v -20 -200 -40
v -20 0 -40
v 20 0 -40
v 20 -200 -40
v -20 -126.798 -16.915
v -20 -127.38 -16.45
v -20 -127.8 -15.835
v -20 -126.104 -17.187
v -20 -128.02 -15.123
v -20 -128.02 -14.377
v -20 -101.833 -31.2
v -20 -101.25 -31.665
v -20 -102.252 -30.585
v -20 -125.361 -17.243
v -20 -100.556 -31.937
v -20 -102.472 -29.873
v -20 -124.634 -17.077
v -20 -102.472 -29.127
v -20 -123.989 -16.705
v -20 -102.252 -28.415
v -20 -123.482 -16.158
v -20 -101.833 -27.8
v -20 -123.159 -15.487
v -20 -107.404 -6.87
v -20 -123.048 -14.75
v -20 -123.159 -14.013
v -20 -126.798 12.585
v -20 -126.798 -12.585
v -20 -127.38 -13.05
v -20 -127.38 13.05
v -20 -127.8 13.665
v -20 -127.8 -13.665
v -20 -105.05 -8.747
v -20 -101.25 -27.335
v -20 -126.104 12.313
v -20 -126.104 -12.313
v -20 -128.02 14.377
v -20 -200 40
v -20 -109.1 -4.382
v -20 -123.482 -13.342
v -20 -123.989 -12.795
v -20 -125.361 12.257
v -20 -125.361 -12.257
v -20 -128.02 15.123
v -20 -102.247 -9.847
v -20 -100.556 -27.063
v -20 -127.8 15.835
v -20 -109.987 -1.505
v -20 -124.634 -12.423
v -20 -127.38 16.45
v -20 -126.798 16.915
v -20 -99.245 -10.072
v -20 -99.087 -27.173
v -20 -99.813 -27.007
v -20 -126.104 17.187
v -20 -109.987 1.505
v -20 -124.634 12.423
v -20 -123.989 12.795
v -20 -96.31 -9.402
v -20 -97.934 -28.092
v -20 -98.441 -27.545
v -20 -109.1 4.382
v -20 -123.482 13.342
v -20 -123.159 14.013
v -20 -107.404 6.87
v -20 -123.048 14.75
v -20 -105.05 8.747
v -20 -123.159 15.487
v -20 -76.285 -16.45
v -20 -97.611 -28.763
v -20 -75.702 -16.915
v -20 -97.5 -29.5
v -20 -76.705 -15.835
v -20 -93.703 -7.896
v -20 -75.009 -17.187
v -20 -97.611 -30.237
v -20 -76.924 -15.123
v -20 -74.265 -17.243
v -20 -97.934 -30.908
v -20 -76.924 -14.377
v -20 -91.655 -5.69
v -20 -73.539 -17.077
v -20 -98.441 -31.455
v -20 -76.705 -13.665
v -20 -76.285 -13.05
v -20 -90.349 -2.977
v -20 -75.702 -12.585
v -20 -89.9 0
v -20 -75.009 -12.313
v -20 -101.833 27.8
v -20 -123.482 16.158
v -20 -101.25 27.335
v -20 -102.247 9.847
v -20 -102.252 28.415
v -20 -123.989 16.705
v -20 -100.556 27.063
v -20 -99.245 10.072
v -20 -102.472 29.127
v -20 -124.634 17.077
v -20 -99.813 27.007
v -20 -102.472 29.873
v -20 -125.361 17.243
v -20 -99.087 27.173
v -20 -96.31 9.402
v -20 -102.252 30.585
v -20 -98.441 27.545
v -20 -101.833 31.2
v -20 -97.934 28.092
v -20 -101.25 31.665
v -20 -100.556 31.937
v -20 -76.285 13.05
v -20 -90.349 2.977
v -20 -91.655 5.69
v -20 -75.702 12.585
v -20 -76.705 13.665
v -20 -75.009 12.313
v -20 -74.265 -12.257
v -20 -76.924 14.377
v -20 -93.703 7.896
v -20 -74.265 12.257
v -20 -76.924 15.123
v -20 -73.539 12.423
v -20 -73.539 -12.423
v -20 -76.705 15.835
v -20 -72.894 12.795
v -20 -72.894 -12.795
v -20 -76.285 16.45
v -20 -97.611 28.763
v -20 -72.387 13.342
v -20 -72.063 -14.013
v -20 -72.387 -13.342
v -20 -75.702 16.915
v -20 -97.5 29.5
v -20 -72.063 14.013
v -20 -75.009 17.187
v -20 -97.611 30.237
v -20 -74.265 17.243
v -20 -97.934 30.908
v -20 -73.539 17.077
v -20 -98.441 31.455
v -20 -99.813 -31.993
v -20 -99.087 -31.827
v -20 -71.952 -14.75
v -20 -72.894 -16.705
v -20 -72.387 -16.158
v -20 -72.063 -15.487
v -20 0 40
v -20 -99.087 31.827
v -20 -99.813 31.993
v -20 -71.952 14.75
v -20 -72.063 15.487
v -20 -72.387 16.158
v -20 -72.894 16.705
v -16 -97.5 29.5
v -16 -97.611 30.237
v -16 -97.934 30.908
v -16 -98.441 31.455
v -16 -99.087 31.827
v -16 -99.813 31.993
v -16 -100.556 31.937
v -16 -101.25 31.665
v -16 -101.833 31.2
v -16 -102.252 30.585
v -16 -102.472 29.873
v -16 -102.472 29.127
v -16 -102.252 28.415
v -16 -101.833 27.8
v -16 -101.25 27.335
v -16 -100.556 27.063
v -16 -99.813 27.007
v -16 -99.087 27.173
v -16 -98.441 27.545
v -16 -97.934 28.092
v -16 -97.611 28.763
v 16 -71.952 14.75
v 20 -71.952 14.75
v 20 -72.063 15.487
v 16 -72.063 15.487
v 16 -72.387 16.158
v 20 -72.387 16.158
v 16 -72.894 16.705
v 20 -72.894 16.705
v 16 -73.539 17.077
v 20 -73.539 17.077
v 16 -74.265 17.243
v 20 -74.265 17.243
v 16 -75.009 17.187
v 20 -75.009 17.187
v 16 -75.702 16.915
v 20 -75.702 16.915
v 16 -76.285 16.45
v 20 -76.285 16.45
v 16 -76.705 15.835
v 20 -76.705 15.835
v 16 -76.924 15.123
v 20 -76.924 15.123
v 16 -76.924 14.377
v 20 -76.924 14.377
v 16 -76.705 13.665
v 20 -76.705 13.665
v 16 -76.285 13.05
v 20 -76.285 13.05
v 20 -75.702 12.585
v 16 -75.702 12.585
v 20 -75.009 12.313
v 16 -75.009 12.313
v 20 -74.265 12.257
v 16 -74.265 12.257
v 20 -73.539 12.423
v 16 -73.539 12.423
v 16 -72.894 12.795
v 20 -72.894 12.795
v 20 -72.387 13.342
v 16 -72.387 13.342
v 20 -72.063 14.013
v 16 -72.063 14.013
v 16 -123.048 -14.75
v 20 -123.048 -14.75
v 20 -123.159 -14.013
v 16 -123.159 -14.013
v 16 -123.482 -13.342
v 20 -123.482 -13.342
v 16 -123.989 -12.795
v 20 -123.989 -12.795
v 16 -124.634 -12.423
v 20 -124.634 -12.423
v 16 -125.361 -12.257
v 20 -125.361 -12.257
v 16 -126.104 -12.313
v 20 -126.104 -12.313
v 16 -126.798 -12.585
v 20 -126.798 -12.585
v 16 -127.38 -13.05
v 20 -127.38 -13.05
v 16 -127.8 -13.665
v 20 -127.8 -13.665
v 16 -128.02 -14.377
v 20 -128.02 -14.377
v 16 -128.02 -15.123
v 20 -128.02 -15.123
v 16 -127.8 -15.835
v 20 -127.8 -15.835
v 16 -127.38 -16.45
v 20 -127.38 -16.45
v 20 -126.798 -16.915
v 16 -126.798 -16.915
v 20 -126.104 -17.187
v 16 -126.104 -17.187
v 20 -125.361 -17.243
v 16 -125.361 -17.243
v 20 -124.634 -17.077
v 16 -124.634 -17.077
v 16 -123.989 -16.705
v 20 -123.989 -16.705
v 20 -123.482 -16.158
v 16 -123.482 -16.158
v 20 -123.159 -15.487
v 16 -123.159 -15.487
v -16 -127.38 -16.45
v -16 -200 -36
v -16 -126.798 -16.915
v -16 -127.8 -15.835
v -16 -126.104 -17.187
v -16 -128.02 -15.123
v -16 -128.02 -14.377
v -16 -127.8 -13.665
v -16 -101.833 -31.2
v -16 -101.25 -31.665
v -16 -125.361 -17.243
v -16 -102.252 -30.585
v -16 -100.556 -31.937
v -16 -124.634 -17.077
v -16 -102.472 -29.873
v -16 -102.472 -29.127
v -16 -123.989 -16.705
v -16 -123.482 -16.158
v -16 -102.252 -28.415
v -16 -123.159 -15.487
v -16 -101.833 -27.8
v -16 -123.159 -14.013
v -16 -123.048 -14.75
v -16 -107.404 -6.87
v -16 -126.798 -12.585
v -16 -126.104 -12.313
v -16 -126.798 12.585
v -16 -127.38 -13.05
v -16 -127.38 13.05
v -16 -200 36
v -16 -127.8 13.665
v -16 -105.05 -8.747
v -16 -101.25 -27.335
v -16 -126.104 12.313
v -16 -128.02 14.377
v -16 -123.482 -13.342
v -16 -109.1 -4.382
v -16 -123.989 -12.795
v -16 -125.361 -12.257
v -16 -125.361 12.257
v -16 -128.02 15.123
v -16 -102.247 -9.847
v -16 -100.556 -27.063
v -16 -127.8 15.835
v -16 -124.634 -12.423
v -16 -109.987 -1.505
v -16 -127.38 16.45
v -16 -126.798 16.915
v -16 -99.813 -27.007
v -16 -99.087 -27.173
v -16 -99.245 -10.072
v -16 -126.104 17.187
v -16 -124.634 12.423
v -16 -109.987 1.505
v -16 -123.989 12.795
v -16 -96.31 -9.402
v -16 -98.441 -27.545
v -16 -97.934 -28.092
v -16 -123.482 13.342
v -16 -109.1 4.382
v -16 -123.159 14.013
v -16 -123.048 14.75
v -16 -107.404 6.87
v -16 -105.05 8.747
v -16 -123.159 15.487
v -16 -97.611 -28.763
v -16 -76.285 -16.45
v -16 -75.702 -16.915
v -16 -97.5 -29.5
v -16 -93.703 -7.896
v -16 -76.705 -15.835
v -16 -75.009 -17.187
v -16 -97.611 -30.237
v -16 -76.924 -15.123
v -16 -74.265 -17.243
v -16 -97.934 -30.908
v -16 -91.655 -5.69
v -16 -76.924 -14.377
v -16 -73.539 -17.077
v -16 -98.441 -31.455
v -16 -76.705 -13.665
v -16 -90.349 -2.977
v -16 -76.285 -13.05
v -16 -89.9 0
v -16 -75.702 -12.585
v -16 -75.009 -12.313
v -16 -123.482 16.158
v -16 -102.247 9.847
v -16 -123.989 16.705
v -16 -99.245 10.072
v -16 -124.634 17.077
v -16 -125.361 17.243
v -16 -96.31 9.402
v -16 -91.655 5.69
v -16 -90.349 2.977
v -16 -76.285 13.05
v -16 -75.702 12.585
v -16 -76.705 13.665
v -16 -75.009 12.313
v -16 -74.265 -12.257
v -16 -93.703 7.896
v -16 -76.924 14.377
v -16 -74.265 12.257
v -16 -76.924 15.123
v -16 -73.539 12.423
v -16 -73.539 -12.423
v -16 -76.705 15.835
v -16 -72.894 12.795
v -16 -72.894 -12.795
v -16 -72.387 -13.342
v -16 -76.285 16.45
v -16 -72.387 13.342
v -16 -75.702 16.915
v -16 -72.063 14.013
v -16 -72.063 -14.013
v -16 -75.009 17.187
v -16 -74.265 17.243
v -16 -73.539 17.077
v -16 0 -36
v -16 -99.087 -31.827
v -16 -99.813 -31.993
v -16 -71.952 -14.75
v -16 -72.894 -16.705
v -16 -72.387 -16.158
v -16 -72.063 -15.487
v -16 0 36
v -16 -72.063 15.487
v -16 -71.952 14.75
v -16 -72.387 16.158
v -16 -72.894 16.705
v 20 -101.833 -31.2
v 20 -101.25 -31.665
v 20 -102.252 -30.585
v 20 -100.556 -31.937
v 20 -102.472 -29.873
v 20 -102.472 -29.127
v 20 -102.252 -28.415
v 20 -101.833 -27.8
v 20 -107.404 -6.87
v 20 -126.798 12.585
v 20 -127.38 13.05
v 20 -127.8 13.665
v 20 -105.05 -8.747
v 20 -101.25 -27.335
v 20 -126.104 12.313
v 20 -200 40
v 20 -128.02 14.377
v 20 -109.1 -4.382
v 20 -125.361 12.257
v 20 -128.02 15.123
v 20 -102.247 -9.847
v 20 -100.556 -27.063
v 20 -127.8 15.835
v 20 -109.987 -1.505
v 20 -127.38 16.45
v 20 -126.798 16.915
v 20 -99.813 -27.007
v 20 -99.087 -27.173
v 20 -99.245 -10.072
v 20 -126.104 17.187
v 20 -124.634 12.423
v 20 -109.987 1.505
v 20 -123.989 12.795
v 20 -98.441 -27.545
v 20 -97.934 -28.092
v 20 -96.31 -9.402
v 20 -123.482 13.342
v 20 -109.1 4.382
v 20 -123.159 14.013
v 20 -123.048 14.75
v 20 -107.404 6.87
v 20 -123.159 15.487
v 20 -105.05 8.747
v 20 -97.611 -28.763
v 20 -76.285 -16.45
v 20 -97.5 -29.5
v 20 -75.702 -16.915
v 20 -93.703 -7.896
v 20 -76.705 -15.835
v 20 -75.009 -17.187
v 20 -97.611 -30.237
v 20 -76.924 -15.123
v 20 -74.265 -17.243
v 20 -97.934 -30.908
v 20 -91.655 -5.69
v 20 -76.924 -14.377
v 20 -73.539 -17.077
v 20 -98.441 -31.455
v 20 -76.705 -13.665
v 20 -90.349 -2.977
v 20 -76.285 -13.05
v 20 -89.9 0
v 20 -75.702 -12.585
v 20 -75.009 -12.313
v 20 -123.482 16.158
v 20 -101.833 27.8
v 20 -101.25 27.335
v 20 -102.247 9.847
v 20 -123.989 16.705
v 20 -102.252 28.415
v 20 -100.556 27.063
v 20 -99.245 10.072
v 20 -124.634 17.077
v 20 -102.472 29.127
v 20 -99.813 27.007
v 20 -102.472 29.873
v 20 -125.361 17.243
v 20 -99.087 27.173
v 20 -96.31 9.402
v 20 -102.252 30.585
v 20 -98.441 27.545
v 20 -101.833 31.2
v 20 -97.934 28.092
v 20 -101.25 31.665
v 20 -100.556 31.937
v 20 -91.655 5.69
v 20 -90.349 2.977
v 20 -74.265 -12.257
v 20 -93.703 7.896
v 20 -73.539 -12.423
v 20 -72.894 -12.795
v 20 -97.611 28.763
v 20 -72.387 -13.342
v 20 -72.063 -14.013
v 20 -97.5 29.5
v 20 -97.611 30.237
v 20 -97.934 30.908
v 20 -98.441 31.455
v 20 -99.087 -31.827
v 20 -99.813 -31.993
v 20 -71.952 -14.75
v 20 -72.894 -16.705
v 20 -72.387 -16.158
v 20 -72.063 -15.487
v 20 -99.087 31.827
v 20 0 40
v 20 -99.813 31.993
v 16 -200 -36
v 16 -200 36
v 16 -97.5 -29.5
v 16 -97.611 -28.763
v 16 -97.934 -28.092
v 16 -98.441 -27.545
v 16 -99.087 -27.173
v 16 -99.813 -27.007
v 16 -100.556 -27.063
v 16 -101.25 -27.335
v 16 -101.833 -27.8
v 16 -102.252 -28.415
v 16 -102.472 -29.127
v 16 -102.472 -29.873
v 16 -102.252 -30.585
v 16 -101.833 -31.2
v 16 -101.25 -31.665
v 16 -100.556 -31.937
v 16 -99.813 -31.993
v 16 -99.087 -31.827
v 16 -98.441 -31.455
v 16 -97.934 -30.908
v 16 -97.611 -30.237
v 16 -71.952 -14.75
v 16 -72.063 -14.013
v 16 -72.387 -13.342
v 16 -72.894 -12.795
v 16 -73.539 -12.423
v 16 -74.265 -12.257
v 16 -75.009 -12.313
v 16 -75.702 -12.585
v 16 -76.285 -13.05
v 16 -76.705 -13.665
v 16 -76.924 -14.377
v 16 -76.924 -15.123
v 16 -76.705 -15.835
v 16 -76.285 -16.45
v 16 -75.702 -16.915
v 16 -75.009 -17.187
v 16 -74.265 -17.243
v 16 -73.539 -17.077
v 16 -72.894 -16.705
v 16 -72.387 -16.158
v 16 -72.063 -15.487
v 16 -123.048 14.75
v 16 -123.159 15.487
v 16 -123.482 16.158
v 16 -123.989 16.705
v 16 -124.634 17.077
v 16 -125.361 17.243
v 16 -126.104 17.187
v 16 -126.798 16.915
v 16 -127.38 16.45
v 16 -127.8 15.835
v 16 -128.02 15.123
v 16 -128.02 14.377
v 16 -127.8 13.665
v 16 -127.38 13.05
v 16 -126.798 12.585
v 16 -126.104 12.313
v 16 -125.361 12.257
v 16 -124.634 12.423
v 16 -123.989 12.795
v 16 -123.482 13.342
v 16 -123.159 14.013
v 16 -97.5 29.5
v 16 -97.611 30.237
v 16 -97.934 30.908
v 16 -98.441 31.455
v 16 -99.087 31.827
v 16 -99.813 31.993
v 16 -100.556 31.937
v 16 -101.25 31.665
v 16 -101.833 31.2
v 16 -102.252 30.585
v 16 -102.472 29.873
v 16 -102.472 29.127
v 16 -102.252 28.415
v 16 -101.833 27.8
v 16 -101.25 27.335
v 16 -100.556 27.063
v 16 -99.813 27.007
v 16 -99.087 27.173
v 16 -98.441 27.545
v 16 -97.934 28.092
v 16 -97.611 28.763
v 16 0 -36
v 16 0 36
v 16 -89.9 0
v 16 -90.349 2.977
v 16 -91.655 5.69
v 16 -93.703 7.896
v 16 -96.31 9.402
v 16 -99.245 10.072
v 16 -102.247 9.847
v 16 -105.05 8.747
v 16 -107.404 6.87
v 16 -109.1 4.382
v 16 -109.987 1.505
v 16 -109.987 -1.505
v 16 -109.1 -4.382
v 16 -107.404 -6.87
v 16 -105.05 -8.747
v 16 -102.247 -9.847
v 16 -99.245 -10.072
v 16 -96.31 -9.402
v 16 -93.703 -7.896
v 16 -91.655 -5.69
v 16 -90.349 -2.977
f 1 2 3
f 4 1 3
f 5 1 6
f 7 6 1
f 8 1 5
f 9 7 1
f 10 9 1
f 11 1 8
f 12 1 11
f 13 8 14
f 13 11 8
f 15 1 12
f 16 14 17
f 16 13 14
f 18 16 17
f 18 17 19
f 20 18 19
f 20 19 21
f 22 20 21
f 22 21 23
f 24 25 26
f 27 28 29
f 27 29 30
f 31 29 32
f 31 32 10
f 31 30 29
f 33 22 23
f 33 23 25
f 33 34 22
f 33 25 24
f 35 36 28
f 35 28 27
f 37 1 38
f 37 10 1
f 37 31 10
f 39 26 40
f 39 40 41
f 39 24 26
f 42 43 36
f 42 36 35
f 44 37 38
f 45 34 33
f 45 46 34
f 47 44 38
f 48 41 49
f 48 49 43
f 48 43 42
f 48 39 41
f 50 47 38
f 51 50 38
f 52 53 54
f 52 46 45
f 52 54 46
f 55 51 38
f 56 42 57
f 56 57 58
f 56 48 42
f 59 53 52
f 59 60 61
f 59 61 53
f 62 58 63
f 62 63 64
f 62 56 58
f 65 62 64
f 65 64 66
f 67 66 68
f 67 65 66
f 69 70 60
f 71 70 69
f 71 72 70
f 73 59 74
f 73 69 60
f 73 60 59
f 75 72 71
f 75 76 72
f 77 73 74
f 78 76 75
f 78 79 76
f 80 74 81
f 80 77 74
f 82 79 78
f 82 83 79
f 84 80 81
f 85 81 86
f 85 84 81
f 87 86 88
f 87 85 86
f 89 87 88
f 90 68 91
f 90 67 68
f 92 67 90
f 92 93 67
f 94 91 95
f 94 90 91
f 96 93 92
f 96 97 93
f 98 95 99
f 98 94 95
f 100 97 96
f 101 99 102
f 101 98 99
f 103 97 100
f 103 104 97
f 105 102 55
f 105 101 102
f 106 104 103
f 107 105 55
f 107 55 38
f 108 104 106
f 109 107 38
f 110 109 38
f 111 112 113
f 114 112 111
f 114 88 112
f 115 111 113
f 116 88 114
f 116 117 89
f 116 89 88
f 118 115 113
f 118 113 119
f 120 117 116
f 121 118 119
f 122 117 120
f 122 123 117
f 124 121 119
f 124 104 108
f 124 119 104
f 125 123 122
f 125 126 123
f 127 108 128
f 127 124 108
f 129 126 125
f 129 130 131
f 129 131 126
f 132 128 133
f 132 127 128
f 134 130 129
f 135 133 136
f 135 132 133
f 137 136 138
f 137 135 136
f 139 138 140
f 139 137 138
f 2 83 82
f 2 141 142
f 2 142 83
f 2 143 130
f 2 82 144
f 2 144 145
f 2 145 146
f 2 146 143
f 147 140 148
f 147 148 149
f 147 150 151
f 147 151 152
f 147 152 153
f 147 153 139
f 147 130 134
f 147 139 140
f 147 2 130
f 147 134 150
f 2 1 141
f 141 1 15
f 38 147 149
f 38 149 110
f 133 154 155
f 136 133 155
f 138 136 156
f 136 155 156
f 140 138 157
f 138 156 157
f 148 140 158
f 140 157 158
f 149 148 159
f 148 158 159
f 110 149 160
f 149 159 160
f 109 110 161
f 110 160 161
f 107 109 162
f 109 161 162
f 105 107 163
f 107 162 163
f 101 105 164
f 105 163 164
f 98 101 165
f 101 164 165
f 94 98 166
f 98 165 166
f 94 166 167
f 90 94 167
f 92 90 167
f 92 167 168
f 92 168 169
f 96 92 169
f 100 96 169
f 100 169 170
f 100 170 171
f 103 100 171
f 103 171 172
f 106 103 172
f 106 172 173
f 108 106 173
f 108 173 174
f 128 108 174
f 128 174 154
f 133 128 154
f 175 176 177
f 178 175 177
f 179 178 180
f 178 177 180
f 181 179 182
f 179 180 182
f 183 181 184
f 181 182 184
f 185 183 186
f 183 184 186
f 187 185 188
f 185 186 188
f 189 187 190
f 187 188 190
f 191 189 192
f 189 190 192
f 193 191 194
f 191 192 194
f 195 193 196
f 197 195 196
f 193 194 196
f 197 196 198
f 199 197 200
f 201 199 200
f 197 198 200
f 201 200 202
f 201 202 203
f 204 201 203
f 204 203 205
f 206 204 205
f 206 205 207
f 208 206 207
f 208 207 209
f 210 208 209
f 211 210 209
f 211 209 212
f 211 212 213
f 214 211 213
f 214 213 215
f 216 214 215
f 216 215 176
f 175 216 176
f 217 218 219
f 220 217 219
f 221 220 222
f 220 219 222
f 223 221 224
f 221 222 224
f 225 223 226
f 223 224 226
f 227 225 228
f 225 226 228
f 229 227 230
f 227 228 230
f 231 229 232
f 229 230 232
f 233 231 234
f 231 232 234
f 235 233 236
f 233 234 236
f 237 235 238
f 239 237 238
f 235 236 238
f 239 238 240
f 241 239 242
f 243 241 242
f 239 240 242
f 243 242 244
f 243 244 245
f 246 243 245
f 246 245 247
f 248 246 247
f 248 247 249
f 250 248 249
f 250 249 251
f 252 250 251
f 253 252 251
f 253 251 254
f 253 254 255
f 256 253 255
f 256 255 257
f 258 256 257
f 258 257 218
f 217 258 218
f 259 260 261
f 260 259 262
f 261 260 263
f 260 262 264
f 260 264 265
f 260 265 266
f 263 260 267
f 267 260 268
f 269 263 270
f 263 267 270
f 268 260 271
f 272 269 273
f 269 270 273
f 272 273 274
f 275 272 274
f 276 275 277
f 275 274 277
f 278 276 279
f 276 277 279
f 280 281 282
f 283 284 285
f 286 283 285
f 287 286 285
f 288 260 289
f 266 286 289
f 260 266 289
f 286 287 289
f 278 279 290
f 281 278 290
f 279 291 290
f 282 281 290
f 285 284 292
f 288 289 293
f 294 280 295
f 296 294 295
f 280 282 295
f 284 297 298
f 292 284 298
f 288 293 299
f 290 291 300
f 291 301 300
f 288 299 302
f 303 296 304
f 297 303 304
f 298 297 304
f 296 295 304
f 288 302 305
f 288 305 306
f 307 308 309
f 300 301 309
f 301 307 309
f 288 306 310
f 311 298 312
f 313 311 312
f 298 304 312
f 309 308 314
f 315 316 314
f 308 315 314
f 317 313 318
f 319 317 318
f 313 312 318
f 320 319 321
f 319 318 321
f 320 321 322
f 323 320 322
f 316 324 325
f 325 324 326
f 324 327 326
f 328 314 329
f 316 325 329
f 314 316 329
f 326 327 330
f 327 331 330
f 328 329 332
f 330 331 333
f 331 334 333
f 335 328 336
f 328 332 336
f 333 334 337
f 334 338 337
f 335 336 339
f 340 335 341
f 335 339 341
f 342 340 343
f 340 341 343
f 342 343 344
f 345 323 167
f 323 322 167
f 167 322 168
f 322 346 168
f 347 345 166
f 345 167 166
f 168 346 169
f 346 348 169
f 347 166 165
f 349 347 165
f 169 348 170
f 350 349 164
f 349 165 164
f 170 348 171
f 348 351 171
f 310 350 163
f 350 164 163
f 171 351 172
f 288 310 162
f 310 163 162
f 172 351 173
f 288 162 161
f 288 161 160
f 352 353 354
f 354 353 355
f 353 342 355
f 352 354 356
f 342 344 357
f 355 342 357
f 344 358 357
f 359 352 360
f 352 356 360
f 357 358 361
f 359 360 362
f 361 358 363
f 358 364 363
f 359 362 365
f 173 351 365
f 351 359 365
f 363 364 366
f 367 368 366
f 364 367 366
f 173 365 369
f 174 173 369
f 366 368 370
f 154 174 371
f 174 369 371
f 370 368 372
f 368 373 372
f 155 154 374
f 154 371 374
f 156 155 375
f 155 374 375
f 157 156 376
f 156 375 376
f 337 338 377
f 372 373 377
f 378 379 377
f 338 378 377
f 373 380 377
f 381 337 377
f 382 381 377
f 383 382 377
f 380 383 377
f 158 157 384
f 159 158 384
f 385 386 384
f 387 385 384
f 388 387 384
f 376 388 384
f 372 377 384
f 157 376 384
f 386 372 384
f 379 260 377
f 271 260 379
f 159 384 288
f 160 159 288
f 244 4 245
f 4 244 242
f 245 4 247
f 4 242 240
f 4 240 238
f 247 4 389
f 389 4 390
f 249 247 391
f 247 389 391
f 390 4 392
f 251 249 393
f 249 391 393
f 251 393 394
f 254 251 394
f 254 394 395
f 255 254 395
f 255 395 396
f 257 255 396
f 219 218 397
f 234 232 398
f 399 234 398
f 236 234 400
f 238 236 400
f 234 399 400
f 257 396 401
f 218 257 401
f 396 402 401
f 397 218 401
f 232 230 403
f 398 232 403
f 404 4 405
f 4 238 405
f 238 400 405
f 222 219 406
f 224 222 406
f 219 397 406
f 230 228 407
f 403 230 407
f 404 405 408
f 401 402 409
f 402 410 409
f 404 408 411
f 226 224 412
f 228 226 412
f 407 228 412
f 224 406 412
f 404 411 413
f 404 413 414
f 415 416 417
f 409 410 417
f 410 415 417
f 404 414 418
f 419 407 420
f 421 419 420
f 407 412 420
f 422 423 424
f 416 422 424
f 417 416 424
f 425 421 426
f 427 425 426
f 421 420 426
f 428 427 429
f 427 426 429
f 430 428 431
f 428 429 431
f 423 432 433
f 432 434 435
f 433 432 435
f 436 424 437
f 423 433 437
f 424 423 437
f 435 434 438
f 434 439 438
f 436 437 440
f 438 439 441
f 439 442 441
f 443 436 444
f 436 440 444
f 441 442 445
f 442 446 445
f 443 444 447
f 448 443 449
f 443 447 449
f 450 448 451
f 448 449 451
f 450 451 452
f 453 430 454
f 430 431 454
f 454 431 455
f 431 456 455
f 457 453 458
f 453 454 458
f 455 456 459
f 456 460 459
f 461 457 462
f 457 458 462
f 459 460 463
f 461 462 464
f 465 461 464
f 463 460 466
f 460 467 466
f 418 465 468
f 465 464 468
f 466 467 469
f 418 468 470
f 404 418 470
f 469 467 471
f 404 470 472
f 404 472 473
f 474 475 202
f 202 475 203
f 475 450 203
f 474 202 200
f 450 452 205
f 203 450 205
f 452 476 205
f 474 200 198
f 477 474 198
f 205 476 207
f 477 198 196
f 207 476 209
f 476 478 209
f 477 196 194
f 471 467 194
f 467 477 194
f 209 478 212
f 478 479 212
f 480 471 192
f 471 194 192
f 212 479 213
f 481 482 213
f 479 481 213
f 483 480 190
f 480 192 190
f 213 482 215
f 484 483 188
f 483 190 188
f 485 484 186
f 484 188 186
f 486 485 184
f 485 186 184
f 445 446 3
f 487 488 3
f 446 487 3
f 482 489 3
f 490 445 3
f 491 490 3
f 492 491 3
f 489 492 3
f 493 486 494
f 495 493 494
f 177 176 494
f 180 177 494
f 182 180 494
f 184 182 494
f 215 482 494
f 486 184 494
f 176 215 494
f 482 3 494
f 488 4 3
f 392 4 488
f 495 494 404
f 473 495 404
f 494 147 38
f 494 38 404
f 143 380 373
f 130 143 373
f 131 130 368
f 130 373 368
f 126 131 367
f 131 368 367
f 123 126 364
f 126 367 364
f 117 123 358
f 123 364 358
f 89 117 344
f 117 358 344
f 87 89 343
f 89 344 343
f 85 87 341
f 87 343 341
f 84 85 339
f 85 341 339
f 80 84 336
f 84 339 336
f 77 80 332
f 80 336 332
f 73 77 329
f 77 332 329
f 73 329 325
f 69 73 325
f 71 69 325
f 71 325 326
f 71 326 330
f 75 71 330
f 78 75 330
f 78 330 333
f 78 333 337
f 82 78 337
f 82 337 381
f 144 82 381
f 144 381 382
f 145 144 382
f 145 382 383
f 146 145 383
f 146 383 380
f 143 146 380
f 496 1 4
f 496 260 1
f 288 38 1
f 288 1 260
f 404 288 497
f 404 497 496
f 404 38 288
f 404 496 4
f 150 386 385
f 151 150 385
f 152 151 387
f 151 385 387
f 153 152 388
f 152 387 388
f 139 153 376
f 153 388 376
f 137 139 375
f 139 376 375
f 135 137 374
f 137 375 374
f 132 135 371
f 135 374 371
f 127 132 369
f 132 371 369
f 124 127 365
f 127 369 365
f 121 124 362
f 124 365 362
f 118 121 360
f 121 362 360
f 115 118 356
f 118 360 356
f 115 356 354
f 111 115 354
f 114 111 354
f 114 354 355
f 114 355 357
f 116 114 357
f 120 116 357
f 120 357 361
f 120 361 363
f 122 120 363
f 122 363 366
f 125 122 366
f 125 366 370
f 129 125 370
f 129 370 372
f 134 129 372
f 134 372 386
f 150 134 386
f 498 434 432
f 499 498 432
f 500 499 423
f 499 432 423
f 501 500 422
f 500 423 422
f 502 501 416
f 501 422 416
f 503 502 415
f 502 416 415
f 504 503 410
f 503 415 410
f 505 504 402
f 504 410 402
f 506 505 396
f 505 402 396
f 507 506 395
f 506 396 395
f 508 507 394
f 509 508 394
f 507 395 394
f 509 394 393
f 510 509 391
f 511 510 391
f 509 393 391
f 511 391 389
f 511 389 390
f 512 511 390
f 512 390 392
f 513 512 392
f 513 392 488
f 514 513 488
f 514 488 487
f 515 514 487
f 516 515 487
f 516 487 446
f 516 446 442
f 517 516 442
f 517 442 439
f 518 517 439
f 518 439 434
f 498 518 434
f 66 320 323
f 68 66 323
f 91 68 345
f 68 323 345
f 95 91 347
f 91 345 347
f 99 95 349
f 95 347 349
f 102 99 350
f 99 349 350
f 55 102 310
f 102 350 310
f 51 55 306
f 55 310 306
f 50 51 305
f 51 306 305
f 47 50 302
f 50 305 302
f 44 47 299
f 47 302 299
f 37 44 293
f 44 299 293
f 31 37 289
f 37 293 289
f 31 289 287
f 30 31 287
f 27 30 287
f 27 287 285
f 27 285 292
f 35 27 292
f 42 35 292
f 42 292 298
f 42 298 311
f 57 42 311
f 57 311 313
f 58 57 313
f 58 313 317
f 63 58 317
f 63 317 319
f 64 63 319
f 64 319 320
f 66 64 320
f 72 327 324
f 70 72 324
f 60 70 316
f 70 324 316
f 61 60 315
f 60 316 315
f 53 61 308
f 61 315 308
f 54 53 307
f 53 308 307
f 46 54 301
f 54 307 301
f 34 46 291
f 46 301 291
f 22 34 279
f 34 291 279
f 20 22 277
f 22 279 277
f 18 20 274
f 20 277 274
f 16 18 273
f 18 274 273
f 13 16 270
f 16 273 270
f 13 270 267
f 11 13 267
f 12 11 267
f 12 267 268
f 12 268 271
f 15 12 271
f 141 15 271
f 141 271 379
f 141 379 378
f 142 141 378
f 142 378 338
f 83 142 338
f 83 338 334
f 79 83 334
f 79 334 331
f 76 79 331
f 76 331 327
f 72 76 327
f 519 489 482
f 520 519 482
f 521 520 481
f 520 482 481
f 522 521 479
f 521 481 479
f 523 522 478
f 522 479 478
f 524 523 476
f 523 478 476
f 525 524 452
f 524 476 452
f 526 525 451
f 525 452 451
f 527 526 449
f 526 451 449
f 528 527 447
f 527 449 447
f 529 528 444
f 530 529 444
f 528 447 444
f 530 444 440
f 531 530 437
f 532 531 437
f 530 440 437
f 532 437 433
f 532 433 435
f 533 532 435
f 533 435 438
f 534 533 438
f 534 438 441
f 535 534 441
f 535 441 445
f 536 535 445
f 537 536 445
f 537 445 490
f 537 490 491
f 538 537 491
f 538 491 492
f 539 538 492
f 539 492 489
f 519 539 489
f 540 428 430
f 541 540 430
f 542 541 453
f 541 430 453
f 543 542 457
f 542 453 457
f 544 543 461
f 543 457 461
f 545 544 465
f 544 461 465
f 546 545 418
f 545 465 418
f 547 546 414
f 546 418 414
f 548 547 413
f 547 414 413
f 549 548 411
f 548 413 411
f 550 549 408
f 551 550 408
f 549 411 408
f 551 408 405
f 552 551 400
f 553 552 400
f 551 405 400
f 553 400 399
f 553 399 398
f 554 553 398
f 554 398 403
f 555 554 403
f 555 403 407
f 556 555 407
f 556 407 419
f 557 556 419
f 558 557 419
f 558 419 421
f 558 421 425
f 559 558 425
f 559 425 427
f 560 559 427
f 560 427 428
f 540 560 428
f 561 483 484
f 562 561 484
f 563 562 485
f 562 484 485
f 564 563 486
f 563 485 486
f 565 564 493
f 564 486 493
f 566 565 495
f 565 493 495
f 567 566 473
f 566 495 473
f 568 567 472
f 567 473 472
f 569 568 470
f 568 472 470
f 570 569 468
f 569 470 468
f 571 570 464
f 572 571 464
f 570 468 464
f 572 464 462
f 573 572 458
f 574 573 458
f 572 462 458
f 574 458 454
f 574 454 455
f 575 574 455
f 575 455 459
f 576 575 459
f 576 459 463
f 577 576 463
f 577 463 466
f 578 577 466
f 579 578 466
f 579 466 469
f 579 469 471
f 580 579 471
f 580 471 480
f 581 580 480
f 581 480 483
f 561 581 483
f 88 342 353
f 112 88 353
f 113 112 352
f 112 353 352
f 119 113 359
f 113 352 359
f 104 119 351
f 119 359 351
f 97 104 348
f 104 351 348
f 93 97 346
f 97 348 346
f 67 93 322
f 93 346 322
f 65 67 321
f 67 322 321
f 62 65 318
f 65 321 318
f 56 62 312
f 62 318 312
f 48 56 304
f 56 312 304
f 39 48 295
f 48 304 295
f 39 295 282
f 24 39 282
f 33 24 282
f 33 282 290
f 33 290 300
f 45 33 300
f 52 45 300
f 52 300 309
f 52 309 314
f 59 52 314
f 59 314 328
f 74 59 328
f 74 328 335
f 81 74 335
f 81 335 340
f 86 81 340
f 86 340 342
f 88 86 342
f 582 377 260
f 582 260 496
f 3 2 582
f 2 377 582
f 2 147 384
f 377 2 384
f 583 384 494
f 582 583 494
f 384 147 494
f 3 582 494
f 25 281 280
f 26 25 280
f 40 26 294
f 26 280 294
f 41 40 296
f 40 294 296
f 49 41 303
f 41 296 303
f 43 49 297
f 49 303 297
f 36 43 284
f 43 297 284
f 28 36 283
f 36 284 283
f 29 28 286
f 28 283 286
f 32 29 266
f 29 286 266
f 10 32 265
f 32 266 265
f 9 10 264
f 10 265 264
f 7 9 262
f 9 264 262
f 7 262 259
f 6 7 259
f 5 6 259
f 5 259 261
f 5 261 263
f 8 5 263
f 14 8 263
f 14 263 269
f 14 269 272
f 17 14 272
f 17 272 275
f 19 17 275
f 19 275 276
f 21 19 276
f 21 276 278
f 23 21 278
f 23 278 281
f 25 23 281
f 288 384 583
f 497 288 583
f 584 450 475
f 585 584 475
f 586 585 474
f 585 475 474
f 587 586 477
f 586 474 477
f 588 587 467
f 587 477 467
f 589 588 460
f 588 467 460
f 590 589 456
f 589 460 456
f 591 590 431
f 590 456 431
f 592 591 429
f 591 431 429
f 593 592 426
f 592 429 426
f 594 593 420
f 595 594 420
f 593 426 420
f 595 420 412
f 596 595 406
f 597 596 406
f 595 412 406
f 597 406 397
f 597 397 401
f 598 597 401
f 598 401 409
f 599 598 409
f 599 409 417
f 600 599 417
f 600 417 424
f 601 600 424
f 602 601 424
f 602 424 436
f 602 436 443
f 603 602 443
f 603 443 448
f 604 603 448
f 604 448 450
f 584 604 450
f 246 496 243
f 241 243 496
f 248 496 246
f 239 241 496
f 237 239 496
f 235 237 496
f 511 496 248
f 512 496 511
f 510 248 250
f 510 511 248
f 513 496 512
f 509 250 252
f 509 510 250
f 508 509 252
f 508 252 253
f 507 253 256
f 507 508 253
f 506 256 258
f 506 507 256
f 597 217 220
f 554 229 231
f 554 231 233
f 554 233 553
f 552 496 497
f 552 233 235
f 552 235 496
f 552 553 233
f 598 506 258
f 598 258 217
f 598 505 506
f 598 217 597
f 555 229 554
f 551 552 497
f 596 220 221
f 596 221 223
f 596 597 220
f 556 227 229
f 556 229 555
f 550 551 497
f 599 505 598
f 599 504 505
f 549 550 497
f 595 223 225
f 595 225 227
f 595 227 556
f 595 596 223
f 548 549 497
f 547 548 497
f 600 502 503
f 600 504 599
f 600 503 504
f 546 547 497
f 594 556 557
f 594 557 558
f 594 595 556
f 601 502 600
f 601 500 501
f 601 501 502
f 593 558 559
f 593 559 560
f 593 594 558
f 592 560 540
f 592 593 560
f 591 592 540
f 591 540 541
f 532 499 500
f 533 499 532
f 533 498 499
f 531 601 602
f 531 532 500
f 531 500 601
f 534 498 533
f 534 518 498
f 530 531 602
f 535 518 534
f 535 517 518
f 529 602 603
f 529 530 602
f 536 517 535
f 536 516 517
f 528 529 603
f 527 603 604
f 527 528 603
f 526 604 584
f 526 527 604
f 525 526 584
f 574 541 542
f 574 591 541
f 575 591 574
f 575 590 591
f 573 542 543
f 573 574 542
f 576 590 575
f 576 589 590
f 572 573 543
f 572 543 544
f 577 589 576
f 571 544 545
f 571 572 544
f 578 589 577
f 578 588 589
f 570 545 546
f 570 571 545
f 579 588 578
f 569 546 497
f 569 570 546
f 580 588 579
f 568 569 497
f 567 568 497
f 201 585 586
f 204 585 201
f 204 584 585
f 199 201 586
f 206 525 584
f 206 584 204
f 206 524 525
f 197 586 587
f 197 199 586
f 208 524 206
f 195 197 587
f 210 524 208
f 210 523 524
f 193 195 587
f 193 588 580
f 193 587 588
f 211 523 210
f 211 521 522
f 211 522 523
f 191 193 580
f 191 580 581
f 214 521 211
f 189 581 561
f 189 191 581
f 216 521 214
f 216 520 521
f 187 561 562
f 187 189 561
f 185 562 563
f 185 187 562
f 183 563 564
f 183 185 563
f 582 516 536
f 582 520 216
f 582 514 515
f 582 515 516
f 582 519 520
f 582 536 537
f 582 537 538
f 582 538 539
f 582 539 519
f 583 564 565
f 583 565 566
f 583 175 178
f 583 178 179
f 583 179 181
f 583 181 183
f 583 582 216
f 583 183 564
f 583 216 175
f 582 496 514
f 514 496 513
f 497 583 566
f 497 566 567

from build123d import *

# Parameters (mm, degrees)
F0_W     = 40
F0_H     = 80
F0_W_2   = 32
F0_H_2   = 72
F1_DEPTH = 200
F2_R     = 10.1
F3_DEPTH = 40.001
F4_R     = 2.5
F5_DEPTH = 40.001


with BuildPart() as f1:
    # F0 (on Front) → F1 (new body)
    with BuildSketch(Plane.XZ):
        Rectangle(F0_W, F0_H)
        Rectangle(F0_W_2, F0_H_2, mode=Mode.SUBTRACT)
    extrude(amount=F1_DEPTH)

    # F2 (on face) → F3 (cut, through all)
    with BuildSketch(Plane.YZ.offset(20)):
        with Locations((-100, 0)):
            Circle(F2_R)
    extrude(amount=-F3_DEPTH, mode=Mode.SUBTRACT)

    # F4 (on face) → F5 (cut, through all)
    with BuildSketch(Plane.YZ.offset(20)):
        with Locations((-125.547749, -14.75)):
            Circle(F4_R)
        with Locations((-125.547749, 14.75)):
            Circle(F4_R)
        with Locations((-100, 29.5)):
            Circle(F4_R)
        with Locations((-74.452251, 14.75)):
            Circle(F4_R)
        with Locations((-74.452251, -14.75)):
            Circle(F4_R)
        with Locations((-100, -29.5)):
            Circle(F4_R)
    extrude(amount=-F5_DEPTH, mode=Mode.SUBTRACT)


solid = f1.part
